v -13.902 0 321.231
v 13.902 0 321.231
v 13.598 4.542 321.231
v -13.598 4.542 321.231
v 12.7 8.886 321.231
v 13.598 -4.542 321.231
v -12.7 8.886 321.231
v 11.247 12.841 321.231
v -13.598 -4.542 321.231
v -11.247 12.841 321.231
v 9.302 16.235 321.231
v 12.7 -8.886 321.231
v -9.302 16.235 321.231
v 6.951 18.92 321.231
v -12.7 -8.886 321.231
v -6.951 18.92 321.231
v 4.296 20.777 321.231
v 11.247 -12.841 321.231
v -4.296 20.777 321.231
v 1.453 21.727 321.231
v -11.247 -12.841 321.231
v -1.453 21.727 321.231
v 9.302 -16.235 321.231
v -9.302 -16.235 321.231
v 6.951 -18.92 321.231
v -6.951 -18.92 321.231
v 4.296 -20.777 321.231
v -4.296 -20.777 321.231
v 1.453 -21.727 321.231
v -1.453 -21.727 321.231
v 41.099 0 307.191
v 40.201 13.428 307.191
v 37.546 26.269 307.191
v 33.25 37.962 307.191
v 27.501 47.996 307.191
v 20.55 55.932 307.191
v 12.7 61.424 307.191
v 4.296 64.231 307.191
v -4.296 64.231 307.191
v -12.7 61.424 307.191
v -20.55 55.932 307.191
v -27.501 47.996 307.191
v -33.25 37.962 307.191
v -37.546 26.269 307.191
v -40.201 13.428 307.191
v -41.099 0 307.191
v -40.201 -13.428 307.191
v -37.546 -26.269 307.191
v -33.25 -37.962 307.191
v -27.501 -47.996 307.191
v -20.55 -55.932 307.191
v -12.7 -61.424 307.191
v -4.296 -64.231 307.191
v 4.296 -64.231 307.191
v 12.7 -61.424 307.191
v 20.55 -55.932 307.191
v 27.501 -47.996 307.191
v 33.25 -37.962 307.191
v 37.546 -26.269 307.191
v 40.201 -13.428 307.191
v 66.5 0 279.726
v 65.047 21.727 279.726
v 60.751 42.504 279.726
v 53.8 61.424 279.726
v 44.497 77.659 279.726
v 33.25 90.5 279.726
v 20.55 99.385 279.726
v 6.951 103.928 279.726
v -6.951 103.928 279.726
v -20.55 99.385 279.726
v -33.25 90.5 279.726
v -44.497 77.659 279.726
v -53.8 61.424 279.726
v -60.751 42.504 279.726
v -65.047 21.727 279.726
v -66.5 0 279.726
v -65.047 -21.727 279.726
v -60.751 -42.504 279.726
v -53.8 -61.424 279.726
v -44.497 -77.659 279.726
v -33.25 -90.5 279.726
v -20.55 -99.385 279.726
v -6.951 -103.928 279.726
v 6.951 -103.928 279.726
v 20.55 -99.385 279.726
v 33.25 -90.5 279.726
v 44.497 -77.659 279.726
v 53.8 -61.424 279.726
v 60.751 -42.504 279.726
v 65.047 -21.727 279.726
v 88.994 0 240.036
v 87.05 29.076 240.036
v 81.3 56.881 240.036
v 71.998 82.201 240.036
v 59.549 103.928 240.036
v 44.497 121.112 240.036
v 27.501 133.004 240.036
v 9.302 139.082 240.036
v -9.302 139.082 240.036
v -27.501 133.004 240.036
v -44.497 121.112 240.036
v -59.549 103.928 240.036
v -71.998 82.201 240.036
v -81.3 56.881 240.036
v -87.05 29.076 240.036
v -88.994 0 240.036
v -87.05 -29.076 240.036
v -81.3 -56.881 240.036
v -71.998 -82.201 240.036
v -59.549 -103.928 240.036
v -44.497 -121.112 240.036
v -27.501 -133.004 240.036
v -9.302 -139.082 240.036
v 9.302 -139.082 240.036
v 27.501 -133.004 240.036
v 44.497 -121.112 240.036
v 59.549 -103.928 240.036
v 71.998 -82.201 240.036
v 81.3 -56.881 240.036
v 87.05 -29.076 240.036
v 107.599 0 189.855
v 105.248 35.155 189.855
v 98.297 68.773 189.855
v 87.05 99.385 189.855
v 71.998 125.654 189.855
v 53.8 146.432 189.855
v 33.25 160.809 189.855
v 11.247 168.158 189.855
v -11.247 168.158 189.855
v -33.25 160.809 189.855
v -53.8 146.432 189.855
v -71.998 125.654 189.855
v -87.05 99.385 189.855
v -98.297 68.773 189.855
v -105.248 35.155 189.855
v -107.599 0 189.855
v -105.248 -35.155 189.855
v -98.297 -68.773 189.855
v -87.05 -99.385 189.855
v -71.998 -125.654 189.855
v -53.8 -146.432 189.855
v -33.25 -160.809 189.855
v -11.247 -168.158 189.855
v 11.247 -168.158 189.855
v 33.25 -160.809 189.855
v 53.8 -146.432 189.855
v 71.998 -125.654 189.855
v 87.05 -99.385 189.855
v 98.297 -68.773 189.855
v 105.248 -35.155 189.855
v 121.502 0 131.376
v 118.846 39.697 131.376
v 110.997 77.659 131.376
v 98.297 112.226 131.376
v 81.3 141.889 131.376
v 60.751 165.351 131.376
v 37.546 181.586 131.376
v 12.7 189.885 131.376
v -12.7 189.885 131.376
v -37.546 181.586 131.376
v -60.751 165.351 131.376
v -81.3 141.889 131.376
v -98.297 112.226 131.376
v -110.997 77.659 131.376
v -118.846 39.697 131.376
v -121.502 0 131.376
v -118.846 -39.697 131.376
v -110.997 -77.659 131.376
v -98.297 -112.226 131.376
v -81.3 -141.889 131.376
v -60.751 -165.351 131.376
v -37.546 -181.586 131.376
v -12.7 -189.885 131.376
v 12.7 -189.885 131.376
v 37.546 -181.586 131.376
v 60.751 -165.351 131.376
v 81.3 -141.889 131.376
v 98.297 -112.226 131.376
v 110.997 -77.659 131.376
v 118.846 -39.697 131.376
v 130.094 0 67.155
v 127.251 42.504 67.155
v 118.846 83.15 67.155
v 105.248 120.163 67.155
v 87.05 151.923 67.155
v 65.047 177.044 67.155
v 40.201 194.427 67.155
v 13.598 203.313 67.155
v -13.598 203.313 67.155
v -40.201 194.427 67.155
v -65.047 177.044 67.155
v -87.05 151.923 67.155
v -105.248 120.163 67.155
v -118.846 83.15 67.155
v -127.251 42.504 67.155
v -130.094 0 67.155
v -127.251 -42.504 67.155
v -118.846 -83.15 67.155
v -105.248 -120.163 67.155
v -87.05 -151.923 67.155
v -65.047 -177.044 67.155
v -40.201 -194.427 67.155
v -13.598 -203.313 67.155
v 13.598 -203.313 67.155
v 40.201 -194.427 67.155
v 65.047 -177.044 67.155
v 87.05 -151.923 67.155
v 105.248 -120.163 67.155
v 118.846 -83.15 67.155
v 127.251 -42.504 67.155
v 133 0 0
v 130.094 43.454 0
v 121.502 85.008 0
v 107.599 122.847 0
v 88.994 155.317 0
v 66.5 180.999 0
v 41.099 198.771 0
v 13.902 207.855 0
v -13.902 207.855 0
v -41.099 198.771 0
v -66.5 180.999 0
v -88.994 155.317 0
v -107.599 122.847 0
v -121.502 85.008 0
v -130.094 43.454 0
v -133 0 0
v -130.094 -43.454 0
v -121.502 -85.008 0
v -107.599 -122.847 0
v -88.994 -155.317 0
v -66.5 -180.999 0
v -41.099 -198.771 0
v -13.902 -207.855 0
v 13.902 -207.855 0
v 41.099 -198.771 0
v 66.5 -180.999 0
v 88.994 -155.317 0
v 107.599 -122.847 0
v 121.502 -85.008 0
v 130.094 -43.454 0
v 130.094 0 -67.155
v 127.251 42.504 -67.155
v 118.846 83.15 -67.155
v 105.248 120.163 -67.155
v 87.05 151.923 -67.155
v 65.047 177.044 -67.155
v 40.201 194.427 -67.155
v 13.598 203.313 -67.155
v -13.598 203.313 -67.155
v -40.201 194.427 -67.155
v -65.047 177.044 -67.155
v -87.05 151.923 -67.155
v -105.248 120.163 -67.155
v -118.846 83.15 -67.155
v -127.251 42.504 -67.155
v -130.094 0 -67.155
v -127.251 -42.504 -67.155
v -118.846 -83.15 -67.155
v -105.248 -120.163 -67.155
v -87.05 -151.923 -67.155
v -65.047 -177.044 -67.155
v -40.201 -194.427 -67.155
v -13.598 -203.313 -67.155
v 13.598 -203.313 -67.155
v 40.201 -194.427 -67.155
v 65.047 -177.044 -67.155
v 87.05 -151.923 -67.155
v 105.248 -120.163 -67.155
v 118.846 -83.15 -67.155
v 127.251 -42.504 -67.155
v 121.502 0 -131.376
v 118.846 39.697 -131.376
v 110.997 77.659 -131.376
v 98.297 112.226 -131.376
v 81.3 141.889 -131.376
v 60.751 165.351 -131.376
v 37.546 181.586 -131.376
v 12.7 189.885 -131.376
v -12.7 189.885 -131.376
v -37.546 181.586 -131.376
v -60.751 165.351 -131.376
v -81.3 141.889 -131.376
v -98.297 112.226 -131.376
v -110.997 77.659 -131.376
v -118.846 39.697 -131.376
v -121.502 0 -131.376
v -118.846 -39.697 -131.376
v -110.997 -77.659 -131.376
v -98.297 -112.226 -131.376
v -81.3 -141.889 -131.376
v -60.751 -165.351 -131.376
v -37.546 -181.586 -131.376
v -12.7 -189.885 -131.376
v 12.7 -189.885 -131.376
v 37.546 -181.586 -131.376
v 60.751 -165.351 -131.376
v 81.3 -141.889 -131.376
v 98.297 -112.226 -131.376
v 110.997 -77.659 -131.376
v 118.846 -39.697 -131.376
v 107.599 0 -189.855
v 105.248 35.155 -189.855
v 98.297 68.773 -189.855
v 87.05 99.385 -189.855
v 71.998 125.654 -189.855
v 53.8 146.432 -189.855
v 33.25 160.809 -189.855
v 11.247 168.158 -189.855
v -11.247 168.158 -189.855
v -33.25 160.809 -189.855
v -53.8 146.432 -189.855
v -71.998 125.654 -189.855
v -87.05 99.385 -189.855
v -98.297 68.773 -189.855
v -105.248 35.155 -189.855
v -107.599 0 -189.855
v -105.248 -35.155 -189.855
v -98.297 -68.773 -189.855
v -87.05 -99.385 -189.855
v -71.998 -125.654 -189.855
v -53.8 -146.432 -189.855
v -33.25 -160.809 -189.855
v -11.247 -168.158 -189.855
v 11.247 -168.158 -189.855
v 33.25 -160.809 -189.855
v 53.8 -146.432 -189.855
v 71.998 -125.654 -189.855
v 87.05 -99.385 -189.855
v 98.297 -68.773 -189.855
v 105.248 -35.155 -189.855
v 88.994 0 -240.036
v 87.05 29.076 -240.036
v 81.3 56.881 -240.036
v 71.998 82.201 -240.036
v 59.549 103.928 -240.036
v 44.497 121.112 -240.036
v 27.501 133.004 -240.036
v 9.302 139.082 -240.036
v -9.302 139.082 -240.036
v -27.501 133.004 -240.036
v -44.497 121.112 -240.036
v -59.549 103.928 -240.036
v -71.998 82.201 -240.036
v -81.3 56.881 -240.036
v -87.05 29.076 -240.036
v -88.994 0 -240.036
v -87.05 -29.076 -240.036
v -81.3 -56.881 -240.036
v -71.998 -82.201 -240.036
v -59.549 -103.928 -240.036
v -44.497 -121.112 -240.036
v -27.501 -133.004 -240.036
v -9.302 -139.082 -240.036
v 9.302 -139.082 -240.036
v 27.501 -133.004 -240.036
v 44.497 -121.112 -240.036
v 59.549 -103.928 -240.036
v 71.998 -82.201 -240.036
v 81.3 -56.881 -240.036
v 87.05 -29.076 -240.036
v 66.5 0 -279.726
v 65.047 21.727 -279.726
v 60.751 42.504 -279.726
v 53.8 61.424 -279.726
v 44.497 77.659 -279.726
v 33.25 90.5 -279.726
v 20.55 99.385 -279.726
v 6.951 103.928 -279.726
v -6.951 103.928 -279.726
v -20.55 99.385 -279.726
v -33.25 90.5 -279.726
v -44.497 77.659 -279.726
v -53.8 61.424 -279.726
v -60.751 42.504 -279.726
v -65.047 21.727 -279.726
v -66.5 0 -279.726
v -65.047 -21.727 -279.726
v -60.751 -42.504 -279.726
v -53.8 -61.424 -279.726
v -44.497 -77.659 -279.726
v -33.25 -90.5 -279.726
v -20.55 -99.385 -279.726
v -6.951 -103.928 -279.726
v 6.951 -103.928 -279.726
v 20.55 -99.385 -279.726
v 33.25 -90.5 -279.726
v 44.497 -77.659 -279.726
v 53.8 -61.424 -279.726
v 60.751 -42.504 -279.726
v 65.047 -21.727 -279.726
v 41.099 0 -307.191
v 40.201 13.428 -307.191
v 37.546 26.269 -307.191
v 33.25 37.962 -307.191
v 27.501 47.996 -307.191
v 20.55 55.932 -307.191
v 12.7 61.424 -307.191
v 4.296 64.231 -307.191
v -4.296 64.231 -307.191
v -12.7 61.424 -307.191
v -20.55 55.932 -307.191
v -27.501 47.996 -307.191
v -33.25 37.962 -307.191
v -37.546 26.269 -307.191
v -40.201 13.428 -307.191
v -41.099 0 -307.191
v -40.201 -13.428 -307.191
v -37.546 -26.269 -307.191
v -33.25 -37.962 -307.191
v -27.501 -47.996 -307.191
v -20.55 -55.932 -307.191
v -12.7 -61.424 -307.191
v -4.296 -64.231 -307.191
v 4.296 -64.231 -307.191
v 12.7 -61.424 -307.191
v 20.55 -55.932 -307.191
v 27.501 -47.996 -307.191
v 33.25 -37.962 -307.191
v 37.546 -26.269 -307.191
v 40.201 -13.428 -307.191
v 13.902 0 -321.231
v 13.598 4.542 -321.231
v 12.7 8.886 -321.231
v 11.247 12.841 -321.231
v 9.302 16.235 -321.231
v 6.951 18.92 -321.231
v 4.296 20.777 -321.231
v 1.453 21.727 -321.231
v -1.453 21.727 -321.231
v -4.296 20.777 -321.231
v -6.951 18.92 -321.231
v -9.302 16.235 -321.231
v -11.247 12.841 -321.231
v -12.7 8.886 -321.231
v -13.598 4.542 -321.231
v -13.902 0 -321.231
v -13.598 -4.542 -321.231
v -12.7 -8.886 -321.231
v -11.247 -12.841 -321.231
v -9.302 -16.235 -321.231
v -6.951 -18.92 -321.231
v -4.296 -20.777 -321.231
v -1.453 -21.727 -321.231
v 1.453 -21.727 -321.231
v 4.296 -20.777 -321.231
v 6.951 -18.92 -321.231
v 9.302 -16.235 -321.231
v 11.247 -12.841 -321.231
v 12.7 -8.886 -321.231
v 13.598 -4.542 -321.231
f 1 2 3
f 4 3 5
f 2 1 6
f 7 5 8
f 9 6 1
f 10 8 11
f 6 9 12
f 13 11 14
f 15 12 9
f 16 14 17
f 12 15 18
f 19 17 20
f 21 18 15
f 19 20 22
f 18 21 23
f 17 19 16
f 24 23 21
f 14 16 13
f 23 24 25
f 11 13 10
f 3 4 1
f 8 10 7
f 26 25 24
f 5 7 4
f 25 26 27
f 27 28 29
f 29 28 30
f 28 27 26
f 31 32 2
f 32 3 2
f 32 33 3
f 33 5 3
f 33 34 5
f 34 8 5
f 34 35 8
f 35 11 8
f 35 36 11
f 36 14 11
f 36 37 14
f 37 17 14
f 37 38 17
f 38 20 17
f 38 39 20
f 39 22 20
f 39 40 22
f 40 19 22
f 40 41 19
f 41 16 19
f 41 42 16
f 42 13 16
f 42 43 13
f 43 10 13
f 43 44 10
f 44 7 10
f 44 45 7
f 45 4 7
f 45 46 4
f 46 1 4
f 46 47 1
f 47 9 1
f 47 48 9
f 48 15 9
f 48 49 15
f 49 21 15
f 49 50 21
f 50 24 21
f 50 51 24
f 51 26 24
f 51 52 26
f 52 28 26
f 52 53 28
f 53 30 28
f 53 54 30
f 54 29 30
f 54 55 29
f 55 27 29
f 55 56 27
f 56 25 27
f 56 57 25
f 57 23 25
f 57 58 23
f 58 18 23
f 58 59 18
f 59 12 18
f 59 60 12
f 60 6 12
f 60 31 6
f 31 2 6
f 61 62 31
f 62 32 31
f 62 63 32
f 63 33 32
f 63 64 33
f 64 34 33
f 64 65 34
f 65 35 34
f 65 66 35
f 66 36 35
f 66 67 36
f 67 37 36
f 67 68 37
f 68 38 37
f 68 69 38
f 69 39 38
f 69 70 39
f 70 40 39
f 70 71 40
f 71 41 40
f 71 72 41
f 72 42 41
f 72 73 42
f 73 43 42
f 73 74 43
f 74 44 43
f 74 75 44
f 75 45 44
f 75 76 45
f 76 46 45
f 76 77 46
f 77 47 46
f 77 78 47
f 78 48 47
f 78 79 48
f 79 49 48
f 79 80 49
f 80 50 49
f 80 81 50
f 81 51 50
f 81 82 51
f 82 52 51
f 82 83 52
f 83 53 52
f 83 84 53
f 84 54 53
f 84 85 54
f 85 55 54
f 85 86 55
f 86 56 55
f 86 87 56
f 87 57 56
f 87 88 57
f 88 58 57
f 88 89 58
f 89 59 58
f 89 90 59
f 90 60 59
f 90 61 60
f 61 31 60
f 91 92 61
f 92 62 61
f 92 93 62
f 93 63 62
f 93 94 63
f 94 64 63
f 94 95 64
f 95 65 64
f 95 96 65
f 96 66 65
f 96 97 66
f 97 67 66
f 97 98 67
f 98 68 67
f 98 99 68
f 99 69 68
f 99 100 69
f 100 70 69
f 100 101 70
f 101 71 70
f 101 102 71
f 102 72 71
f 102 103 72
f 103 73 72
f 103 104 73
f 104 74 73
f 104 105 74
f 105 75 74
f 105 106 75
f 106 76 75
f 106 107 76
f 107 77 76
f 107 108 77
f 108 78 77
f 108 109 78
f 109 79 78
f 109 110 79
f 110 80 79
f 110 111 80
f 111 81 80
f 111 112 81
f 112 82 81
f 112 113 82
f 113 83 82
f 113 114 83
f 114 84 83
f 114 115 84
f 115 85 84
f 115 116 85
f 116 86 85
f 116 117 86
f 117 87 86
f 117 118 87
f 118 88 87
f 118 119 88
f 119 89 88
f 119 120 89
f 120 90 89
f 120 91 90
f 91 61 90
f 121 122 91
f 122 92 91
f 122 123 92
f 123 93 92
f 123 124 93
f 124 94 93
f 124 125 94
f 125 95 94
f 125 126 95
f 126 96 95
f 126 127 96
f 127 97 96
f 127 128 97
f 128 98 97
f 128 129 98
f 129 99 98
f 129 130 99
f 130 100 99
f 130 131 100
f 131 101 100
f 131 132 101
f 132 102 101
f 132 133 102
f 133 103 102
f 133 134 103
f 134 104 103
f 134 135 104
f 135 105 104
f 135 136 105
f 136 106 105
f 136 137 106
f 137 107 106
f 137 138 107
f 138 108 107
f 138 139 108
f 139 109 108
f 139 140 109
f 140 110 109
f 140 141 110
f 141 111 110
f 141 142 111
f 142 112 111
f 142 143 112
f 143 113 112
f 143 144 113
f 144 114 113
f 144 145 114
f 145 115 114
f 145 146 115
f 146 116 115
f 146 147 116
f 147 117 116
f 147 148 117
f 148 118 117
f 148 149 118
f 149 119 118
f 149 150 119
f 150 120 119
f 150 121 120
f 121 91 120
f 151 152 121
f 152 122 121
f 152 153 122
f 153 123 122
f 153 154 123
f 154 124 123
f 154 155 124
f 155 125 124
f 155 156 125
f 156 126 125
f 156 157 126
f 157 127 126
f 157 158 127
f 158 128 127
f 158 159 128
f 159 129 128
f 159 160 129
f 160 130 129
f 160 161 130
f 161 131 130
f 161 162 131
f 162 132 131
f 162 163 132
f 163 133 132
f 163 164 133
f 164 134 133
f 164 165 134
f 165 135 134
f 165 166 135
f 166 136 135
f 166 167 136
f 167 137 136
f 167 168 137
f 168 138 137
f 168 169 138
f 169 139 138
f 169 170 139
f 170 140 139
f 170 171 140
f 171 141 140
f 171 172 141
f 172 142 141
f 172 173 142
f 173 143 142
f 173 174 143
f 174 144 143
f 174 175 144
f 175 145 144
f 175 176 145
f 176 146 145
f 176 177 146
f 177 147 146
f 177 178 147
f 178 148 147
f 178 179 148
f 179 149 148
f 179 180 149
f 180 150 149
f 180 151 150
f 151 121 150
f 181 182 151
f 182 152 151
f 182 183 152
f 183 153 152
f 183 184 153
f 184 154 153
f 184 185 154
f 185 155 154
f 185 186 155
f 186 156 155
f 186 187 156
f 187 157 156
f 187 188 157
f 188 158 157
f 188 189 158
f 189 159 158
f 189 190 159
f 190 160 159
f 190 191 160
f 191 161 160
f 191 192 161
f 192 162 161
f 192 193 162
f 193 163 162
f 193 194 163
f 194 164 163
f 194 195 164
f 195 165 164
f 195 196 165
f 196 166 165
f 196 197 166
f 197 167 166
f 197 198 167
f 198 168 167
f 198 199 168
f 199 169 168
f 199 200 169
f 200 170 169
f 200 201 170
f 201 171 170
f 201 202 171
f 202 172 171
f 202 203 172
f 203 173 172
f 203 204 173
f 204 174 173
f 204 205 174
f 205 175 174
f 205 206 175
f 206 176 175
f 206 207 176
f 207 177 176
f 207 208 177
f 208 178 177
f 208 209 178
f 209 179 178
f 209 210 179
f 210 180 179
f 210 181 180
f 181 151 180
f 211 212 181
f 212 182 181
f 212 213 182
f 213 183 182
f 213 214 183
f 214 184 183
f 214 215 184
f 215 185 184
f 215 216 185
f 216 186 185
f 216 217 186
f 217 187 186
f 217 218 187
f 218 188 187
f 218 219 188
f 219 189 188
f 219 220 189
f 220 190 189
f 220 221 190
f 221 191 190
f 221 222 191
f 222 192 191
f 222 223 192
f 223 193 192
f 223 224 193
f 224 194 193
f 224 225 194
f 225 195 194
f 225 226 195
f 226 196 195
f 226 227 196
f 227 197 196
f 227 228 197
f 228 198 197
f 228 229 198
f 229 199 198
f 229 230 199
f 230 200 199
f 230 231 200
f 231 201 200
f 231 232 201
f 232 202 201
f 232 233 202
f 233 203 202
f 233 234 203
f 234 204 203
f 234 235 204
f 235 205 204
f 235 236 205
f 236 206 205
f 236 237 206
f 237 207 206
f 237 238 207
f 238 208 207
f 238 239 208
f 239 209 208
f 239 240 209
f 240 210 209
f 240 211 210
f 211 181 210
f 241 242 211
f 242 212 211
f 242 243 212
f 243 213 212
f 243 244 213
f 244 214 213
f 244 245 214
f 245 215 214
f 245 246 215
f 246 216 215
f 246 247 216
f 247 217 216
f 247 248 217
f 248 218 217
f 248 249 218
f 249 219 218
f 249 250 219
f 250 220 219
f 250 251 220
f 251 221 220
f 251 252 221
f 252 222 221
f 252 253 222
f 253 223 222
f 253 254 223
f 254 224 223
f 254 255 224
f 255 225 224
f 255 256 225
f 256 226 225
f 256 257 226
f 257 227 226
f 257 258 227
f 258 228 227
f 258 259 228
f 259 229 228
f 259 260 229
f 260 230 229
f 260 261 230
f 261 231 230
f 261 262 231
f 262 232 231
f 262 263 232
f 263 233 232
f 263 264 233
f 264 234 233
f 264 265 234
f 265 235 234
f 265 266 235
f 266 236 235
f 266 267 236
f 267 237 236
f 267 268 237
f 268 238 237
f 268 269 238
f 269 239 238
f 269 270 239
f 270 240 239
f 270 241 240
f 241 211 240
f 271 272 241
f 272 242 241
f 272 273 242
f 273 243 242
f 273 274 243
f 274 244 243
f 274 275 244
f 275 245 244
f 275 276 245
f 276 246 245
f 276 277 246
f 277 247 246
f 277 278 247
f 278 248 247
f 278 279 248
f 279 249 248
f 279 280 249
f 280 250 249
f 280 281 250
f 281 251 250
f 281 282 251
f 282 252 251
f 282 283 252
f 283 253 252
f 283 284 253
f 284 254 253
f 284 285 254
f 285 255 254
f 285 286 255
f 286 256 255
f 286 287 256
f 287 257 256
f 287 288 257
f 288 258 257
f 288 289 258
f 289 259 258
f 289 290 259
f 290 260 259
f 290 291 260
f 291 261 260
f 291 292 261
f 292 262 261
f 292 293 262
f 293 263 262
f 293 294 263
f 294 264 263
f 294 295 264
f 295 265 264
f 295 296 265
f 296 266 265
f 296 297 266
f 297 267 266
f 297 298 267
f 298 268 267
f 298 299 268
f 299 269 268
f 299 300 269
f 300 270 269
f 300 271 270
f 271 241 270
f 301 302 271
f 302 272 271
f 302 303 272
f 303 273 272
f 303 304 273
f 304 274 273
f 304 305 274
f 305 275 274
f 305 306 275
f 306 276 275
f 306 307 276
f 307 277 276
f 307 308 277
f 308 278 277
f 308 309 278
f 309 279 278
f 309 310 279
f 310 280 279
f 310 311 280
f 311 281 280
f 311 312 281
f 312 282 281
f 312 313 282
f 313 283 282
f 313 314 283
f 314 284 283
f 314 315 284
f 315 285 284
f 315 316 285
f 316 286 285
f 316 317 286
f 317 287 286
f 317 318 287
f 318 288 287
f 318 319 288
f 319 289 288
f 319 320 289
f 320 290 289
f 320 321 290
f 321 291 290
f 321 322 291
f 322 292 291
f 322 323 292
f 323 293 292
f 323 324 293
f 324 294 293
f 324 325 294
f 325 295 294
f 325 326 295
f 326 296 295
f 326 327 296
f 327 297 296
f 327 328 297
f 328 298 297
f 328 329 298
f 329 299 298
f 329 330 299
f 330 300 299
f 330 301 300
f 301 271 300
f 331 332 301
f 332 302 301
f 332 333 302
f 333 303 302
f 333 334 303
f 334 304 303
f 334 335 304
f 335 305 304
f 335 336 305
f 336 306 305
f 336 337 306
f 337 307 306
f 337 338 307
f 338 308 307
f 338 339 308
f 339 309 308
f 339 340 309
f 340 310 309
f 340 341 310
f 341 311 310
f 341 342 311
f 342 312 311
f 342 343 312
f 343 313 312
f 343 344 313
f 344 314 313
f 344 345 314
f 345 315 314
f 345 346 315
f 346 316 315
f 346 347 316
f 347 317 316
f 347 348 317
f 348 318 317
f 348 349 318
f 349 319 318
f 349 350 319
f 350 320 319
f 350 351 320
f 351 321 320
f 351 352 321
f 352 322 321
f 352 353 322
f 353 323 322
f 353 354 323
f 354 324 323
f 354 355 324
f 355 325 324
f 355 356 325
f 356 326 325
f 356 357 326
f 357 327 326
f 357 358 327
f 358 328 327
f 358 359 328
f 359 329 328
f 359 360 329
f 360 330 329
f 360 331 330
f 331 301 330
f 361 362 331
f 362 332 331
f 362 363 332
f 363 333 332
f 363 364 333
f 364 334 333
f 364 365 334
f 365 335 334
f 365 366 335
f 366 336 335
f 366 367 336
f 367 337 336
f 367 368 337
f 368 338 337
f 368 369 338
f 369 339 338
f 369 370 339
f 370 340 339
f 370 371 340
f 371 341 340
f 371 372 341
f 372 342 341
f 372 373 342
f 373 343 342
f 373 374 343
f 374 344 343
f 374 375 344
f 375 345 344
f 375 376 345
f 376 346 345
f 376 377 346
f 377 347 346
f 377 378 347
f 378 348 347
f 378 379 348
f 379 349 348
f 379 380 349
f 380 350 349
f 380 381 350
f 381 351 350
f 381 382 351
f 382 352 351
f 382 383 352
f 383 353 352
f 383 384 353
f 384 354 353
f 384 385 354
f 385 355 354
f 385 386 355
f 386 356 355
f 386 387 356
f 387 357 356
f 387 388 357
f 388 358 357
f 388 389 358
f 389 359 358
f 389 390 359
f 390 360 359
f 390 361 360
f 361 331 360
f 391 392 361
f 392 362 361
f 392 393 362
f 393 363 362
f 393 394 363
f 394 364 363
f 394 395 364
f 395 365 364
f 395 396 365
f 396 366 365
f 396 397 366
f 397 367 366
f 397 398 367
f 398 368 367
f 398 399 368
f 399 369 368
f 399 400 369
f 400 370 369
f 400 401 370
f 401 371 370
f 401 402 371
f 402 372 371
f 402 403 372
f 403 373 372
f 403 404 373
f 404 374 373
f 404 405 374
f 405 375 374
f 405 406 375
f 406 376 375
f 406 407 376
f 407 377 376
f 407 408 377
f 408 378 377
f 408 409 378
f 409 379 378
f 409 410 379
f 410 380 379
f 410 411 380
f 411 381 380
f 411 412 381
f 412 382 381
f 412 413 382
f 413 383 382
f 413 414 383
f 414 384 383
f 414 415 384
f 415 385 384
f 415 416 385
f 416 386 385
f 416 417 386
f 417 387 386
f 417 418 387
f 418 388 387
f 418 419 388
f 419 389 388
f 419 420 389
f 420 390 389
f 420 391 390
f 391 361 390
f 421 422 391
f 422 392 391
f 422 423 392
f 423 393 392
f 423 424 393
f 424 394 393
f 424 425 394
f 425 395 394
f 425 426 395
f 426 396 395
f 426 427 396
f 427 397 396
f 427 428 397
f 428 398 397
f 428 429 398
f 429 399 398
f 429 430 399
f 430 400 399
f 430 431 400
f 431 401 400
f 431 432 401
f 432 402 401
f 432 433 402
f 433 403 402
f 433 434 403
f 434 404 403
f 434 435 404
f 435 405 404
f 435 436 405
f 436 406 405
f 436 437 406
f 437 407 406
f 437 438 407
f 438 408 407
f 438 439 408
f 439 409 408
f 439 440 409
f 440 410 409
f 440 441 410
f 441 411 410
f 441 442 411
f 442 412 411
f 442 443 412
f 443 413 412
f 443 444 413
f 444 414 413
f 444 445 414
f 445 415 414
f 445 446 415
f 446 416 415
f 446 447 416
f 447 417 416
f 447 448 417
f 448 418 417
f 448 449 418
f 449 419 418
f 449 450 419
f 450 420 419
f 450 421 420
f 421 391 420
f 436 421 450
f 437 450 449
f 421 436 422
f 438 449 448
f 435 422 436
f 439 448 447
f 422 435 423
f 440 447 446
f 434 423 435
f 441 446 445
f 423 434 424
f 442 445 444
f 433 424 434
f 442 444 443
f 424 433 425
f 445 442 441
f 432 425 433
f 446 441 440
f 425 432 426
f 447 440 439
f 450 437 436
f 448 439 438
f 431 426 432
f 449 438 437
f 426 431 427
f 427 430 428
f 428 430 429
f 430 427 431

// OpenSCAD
// Generated by SolidPython 1.0.1 on 2020-07-29 00:39:26


scale(v = [7, 11, 17]) {
	sphere(r = 19);
}
/***********************************************
*********      SolidPython code:      **********
************************************************
 
# import packages: SolidPython
from solid import *
from solid.utils import *
from itertools import chain, combinations


class Resize:

    def __init__(self, scad_file):
        self.scad_file = scad_file
        #self.scad_file = import_scad(scad_file)
        # cone/cylinder param:
        self.r1 = 0
        self.r2 = 0
        self.h = 0
        # rectangular prism param:
        self.w = 0
        self.l = 0
        # ellipse param:
        self.r = 0

    # import OpenScad code (file name corresponds to shape)


    # classify shape + parameters
    def assign(self, param1, param2, param3):
        if self.scad_file == 'cone.scad':
            self.r1 = param1
            self.r2 = param2
            self.h = param3
        elif self.scad_file == 'cylinder.scad':
            self.r1 = param1
            self.r2 = param2
            self.h = param3
        elif self.scad_file == 'rectangularPrism.scad':
            self.h = param1
            self.l = param2
            self.w = param3
        else:
            self.r = param1
            self.h = param2

    # resize parameters
    def iterate(self):
        x = range(3, 20, 2)
        i = 1
        if self.scad_file == 'cone.scad':
            tempList = list(combinations(x, 2))
            for temp in tempList:
                param1 = temp[0]
                param2 = temp[1]
                filepath = 'produced_scad_files/' + 'cone' + str(param1) + '_' + str(param2) + '_' + '.scad'
                scad_render_to_file(cylinder(h=param1, r1=param2, r2=0), filepath)

        elif self.scad_file == 'cylinder.scad':
            tempList = list(combinations(x, 3))
            for temp in tempList:
                param1 = temp[0]
                param2 = temp[1]
                filepath = 'produced_scad_files/' + 'cylinder' + str(param1) + '_' + str(param2) + '_' + '.scad'
                scad_render_to_file(cylinder(h=param1, r1=param2, r2=param2), filepath)

        elif self.scad_file == 'rectangularPrism.scad':
            tempList = list(combinations(x, 3))
            for temp in tempList:
                param1 = temp[0]
                param2 = temp[1]
                param3 = temp[2]
                filepath = 'produced_scad_files/' + 'rectangularPrism' + str(param1) + '_' + str(param2) + '_' + str(
                    param3) + '.scad'
                scad_render_to_file(cube(size=(param1, param2, param3)), filepath)

        elif self.scad_file == 'ellipse.scad':
            tempList = list(combinations(x, 4))
            for temp in tempList:
                param1 = temp[0]
                param2 = temp[1]
                param3 = temp[2]
                param4 = temp[3]
                filepath = 'produced_scad_files/' + 'ellipse' + str(param1) + '_' + str(param2) + '_' + str(param3) + '_' + str(param4) + '.scad'
                scad_render_to_file(scale([param1, param2, param3])(sphere(r=param4)), filepath)

    def render_to_scadfile(self):
        scad_render_to_file(scad, 'example.scad') 
 
************************************************/
